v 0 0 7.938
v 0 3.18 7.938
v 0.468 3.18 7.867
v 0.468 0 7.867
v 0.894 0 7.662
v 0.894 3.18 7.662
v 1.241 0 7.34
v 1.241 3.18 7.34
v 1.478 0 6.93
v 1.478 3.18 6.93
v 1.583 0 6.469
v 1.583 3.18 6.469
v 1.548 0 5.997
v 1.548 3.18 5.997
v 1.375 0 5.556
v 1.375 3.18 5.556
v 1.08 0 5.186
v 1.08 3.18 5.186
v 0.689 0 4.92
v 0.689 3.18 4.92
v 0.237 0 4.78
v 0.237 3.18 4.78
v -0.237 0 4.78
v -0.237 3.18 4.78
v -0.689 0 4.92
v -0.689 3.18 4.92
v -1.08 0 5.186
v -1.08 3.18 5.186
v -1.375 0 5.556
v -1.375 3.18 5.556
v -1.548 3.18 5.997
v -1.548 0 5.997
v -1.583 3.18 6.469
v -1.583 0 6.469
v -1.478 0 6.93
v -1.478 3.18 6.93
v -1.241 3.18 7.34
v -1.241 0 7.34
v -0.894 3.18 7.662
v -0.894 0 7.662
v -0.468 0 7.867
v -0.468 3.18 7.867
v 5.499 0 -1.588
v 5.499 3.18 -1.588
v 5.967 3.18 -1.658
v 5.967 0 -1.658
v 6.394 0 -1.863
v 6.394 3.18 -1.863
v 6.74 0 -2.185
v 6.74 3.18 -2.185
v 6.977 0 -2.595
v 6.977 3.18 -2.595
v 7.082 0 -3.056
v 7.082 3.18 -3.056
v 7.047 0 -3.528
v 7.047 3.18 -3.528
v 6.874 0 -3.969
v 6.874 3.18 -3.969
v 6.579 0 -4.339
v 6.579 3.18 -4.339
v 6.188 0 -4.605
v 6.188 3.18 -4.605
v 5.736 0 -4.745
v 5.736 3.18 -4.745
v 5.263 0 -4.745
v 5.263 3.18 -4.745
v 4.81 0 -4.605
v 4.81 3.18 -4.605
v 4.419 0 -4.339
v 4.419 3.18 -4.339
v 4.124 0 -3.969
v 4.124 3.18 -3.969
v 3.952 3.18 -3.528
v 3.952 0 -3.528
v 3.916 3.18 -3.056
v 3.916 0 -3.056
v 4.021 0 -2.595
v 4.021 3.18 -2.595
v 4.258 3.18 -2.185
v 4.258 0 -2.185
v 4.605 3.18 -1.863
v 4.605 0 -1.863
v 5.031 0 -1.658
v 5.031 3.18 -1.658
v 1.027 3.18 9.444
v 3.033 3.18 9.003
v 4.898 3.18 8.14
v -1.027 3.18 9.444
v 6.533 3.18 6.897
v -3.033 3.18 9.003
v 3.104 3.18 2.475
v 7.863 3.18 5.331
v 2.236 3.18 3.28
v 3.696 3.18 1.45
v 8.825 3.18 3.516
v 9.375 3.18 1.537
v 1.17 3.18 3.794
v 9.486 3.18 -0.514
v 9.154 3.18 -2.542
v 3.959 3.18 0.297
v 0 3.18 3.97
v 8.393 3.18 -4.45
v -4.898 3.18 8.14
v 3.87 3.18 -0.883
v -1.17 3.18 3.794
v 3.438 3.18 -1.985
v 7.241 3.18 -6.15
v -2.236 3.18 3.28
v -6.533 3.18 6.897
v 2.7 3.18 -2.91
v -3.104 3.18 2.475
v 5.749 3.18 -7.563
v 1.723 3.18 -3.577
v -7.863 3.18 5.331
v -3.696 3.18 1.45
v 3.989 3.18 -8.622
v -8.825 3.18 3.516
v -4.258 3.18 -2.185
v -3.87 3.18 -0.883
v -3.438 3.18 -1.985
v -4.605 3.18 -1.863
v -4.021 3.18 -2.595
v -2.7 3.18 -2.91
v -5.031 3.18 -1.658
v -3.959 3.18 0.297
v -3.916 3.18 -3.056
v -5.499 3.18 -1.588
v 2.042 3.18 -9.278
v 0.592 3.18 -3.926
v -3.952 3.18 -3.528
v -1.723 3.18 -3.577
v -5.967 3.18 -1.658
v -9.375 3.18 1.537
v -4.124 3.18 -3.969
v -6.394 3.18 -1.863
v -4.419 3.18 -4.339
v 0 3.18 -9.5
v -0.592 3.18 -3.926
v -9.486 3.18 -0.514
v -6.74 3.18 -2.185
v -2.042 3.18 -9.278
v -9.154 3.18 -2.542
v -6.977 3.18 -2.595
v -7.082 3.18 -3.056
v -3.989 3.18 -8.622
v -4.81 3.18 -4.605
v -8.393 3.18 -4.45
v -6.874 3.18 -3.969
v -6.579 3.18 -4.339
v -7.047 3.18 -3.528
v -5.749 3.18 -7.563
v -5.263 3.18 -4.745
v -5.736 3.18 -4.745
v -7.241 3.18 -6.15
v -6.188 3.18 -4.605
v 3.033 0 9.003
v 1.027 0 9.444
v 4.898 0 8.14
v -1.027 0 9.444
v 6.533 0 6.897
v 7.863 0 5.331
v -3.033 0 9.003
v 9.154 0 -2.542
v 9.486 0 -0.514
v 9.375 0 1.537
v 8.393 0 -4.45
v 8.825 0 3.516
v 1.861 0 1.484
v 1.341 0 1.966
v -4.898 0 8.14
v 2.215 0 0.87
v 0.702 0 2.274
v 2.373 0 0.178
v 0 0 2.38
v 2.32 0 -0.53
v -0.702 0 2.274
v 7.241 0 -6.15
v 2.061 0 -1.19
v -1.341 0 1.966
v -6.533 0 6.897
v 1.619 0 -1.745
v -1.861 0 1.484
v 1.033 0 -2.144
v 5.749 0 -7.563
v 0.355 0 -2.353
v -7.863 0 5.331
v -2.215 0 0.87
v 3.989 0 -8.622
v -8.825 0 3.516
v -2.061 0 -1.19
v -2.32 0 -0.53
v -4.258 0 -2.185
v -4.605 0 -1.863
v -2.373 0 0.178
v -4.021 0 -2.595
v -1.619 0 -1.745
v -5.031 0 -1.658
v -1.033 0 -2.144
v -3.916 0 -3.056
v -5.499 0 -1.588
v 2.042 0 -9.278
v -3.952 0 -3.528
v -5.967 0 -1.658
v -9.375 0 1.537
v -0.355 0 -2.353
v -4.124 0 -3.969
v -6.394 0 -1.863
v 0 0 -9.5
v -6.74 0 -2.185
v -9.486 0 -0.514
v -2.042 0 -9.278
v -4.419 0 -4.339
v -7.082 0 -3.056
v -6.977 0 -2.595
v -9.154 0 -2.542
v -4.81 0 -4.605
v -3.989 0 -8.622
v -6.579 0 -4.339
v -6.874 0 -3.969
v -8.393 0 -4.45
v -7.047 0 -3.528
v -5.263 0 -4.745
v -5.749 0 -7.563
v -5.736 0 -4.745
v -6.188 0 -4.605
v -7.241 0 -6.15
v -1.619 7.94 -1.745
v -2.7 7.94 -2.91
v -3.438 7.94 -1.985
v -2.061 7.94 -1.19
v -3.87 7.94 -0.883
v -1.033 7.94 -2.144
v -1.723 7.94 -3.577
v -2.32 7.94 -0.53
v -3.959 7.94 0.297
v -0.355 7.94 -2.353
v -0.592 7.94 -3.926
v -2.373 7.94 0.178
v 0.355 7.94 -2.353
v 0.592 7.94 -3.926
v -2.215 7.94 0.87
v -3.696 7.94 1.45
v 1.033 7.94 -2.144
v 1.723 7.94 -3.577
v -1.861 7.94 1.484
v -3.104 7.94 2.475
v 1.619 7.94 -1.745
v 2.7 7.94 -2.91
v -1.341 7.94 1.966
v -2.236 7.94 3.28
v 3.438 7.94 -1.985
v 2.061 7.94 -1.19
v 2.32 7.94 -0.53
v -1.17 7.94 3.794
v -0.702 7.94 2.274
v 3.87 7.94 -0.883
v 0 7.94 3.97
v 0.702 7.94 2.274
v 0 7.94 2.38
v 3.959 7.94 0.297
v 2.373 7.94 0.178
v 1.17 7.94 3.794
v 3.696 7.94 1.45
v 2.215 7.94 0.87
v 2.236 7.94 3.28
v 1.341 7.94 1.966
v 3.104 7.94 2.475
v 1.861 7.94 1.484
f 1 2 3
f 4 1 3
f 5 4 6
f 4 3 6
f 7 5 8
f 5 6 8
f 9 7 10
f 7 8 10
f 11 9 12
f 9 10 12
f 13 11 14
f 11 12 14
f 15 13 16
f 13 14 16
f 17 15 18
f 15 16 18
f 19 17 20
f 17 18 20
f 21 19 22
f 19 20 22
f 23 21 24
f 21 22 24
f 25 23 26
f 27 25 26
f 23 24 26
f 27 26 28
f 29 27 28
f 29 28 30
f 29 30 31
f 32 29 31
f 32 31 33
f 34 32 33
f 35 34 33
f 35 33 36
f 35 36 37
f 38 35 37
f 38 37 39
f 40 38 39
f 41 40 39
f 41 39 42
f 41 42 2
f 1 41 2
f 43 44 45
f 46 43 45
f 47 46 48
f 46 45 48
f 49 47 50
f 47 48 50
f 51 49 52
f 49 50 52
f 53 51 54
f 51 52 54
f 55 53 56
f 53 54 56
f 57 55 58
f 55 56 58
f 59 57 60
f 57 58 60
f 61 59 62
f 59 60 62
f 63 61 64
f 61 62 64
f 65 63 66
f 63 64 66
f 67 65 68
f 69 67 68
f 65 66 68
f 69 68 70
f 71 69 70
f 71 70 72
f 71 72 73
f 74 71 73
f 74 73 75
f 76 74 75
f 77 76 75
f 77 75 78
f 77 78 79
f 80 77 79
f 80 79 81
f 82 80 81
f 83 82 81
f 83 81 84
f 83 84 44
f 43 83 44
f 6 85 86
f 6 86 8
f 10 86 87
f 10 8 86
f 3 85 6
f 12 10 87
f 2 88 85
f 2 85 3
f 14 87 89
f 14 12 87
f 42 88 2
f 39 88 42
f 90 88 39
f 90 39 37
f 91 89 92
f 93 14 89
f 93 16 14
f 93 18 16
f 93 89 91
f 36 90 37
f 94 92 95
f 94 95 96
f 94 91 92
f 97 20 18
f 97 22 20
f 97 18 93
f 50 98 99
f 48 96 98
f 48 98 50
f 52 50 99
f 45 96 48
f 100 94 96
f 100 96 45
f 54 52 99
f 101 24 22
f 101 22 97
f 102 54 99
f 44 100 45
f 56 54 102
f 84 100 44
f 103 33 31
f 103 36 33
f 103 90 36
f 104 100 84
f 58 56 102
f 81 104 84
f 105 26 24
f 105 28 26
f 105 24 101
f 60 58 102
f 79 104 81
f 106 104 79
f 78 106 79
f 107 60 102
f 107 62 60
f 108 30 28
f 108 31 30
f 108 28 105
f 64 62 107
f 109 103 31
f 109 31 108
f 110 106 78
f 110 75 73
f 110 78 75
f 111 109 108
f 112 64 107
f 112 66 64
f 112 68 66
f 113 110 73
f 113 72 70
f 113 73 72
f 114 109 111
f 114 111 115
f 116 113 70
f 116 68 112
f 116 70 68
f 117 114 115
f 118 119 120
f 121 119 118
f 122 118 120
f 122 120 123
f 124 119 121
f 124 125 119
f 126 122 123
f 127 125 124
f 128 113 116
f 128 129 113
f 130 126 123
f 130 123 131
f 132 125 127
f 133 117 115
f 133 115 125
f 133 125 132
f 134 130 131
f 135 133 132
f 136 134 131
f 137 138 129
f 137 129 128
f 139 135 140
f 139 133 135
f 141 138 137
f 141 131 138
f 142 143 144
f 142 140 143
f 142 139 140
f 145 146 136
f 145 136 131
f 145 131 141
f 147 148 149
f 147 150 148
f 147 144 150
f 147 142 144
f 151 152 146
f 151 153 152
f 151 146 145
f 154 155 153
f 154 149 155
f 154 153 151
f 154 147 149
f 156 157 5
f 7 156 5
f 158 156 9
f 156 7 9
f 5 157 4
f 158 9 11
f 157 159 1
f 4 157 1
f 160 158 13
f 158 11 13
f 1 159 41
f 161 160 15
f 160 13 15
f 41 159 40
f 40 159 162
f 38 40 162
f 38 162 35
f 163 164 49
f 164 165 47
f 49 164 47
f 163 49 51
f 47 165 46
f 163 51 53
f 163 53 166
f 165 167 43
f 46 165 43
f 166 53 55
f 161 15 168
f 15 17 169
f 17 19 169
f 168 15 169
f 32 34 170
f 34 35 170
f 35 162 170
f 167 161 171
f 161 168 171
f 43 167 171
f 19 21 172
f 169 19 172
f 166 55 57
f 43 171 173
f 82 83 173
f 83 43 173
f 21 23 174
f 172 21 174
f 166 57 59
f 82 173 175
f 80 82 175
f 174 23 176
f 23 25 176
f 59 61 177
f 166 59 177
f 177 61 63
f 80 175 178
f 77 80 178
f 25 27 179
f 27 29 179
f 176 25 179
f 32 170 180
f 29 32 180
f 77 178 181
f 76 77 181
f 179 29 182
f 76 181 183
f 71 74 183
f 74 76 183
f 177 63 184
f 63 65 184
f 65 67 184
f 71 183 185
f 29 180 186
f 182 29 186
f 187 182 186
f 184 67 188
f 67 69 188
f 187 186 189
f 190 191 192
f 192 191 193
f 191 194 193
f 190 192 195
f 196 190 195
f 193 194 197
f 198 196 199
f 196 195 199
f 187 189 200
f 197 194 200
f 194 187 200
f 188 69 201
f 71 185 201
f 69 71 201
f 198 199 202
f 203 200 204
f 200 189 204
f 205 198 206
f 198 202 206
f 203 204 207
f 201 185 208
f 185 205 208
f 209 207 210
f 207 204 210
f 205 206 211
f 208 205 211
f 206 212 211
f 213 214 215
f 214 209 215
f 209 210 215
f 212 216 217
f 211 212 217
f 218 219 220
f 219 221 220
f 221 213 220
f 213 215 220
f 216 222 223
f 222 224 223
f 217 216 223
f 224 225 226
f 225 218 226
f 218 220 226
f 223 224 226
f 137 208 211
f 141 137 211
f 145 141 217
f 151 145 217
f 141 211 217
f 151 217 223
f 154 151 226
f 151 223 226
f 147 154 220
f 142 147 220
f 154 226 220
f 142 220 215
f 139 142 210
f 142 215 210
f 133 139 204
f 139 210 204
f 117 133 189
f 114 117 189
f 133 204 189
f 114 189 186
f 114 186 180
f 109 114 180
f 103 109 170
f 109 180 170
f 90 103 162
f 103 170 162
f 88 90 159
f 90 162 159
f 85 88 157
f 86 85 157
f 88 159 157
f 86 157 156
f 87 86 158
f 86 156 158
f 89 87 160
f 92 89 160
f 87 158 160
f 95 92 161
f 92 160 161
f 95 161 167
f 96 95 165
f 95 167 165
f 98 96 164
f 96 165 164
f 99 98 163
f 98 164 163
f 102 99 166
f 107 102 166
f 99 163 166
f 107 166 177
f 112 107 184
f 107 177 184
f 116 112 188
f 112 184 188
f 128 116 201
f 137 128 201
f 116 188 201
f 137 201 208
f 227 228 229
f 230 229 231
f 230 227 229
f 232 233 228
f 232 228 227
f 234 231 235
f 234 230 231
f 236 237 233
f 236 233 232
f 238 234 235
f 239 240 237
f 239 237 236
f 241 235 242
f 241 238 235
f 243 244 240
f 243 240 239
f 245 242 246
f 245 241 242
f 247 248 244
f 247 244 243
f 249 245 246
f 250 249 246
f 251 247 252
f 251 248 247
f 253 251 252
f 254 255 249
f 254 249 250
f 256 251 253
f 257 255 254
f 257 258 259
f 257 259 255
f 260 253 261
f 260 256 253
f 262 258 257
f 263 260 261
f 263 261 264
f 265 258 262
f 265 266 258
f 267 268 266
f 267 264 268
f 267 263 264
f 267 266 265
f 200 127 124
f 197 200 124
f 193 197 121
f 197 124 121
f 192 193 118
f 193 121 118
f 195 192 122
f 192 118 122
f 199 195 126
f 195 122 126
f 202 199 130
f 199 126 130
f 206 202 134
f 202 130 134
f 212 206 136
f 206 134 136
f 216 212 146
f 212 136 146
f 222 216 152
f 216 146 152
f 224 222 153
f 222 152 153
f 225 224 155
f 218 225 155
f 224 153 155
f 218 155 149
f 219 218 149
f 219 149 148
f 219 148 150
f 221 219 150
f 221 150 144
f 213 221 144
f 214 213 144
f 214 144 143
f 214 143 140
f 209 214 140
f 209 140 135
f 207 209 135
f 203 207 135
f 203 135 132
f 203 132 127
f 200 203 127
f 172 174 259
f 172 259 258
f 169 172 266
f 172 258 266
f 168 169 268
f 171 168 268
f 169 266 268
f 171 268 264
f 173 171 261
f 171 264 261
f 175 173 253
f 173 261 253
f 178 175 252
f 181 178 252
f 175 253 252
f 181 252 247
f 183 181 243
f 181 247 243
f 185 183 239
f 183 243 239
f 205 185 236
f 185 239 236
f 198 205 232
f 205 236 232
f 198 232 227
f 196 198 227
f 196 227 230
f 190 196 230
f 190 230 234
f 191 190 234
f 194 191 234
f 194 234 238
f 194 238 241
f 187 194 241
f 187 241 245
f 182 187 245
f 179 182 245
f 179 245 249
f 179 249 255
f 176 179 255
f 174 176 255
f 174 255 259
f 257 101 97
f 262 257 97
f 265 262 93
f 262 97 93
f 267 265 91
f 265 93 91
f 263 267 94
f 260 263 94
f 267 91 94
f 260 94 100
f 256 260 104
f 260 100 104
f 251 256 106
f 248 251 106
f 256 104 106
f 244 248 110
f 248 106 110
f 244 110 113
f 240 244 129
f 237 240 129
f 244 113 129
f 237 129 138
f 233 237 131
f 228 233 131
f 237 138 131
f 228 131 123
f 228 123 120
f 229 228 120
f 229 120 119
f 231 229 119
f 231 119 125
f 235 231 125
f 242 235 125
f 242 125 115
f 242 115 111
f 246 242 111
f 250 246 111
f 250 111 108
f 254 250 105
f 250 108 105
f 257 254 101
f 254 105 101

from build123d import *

# Parameters (mm, degrees)
SKETCH1_R           = 9.5
BOSS_EXTRUDE1_DEPTH = 3.18
SKETCH2_R           = 3.97
BOSS_EXTRUDE2_DEPTH = 4.76
SKETCH3_R           = 2.38
CUT_EXTRUDE1_DEPTH  = 16.605883506
SKETCH4_R           = 1.5875
CUT_EXTRUDE2_DEPTH  = 15.253336452


with BuildPart() as part:
    # Sketch1 → Boss-Extrude1 (new body)
    with BuildSketch(Plane(origin=(0, 0, 0), x_dir=(1, 0, 0), z_dir=(0, 1, 0))):
        with Locations(Location((0, 0, 0), (0, 0, 90))):
            Circle(SKETCH1_R)
    extrude(amount=BOSS_EXTRUDE1_DEPTH)

    # Sketch2 → Boss-Extrude2 (add)
    with BuildSketch(Plane(origin=(0, 3.18, 0), x_dir=(1, 0, 0), z_dir=(0, 1, 0))):
        with Locations(Location((0, 0, 0), (0, 0, 270))):
            Circle(SKETCH2_R)
    extrude(amount=BOSS_EXTRUDE2_DEPTH)

    # Sketch3 → Cut-Extrude1 (cut, through all)
    with BuildSketch(Plane(origin=(0, 7.94, 0), x_dir=(1, 0, 0), z_dir=(0, 1, 0))):
        with Locations(Location((0, 0, 0), (0, 0, 270))):
            Circle(SKETCH3_R)
    extrude(amount=-CUT_EXTRUDE1_DEPTH, mode=Mode.SUBTRACT)

    # Sketch4 → Cut-Extrude2 (cut, through all)
    with BuildSketch(Plane(origin=(0, 3.18, 0), x_dir=(1, 0, 0), z_dir=(0, 1, 0))):
        with Locations(Location((0, -6.35, 0), (0, 0, 270))):
            Circle(SKETCH4_R)
        with Locations(Location((-5.499261314, 3.175, 0), (0, 0, 270))):
            Circle(SKETCH4_R)
        with Locations(Location((5.499261314, 3.175, 0), (0, 0, 270))):
            Circle(SKETCH4_R)
    extrude(amount=-CUT_EXTRUDE2_DEPTH, mode=Mode.SUBTRACT)


solid = part.part
